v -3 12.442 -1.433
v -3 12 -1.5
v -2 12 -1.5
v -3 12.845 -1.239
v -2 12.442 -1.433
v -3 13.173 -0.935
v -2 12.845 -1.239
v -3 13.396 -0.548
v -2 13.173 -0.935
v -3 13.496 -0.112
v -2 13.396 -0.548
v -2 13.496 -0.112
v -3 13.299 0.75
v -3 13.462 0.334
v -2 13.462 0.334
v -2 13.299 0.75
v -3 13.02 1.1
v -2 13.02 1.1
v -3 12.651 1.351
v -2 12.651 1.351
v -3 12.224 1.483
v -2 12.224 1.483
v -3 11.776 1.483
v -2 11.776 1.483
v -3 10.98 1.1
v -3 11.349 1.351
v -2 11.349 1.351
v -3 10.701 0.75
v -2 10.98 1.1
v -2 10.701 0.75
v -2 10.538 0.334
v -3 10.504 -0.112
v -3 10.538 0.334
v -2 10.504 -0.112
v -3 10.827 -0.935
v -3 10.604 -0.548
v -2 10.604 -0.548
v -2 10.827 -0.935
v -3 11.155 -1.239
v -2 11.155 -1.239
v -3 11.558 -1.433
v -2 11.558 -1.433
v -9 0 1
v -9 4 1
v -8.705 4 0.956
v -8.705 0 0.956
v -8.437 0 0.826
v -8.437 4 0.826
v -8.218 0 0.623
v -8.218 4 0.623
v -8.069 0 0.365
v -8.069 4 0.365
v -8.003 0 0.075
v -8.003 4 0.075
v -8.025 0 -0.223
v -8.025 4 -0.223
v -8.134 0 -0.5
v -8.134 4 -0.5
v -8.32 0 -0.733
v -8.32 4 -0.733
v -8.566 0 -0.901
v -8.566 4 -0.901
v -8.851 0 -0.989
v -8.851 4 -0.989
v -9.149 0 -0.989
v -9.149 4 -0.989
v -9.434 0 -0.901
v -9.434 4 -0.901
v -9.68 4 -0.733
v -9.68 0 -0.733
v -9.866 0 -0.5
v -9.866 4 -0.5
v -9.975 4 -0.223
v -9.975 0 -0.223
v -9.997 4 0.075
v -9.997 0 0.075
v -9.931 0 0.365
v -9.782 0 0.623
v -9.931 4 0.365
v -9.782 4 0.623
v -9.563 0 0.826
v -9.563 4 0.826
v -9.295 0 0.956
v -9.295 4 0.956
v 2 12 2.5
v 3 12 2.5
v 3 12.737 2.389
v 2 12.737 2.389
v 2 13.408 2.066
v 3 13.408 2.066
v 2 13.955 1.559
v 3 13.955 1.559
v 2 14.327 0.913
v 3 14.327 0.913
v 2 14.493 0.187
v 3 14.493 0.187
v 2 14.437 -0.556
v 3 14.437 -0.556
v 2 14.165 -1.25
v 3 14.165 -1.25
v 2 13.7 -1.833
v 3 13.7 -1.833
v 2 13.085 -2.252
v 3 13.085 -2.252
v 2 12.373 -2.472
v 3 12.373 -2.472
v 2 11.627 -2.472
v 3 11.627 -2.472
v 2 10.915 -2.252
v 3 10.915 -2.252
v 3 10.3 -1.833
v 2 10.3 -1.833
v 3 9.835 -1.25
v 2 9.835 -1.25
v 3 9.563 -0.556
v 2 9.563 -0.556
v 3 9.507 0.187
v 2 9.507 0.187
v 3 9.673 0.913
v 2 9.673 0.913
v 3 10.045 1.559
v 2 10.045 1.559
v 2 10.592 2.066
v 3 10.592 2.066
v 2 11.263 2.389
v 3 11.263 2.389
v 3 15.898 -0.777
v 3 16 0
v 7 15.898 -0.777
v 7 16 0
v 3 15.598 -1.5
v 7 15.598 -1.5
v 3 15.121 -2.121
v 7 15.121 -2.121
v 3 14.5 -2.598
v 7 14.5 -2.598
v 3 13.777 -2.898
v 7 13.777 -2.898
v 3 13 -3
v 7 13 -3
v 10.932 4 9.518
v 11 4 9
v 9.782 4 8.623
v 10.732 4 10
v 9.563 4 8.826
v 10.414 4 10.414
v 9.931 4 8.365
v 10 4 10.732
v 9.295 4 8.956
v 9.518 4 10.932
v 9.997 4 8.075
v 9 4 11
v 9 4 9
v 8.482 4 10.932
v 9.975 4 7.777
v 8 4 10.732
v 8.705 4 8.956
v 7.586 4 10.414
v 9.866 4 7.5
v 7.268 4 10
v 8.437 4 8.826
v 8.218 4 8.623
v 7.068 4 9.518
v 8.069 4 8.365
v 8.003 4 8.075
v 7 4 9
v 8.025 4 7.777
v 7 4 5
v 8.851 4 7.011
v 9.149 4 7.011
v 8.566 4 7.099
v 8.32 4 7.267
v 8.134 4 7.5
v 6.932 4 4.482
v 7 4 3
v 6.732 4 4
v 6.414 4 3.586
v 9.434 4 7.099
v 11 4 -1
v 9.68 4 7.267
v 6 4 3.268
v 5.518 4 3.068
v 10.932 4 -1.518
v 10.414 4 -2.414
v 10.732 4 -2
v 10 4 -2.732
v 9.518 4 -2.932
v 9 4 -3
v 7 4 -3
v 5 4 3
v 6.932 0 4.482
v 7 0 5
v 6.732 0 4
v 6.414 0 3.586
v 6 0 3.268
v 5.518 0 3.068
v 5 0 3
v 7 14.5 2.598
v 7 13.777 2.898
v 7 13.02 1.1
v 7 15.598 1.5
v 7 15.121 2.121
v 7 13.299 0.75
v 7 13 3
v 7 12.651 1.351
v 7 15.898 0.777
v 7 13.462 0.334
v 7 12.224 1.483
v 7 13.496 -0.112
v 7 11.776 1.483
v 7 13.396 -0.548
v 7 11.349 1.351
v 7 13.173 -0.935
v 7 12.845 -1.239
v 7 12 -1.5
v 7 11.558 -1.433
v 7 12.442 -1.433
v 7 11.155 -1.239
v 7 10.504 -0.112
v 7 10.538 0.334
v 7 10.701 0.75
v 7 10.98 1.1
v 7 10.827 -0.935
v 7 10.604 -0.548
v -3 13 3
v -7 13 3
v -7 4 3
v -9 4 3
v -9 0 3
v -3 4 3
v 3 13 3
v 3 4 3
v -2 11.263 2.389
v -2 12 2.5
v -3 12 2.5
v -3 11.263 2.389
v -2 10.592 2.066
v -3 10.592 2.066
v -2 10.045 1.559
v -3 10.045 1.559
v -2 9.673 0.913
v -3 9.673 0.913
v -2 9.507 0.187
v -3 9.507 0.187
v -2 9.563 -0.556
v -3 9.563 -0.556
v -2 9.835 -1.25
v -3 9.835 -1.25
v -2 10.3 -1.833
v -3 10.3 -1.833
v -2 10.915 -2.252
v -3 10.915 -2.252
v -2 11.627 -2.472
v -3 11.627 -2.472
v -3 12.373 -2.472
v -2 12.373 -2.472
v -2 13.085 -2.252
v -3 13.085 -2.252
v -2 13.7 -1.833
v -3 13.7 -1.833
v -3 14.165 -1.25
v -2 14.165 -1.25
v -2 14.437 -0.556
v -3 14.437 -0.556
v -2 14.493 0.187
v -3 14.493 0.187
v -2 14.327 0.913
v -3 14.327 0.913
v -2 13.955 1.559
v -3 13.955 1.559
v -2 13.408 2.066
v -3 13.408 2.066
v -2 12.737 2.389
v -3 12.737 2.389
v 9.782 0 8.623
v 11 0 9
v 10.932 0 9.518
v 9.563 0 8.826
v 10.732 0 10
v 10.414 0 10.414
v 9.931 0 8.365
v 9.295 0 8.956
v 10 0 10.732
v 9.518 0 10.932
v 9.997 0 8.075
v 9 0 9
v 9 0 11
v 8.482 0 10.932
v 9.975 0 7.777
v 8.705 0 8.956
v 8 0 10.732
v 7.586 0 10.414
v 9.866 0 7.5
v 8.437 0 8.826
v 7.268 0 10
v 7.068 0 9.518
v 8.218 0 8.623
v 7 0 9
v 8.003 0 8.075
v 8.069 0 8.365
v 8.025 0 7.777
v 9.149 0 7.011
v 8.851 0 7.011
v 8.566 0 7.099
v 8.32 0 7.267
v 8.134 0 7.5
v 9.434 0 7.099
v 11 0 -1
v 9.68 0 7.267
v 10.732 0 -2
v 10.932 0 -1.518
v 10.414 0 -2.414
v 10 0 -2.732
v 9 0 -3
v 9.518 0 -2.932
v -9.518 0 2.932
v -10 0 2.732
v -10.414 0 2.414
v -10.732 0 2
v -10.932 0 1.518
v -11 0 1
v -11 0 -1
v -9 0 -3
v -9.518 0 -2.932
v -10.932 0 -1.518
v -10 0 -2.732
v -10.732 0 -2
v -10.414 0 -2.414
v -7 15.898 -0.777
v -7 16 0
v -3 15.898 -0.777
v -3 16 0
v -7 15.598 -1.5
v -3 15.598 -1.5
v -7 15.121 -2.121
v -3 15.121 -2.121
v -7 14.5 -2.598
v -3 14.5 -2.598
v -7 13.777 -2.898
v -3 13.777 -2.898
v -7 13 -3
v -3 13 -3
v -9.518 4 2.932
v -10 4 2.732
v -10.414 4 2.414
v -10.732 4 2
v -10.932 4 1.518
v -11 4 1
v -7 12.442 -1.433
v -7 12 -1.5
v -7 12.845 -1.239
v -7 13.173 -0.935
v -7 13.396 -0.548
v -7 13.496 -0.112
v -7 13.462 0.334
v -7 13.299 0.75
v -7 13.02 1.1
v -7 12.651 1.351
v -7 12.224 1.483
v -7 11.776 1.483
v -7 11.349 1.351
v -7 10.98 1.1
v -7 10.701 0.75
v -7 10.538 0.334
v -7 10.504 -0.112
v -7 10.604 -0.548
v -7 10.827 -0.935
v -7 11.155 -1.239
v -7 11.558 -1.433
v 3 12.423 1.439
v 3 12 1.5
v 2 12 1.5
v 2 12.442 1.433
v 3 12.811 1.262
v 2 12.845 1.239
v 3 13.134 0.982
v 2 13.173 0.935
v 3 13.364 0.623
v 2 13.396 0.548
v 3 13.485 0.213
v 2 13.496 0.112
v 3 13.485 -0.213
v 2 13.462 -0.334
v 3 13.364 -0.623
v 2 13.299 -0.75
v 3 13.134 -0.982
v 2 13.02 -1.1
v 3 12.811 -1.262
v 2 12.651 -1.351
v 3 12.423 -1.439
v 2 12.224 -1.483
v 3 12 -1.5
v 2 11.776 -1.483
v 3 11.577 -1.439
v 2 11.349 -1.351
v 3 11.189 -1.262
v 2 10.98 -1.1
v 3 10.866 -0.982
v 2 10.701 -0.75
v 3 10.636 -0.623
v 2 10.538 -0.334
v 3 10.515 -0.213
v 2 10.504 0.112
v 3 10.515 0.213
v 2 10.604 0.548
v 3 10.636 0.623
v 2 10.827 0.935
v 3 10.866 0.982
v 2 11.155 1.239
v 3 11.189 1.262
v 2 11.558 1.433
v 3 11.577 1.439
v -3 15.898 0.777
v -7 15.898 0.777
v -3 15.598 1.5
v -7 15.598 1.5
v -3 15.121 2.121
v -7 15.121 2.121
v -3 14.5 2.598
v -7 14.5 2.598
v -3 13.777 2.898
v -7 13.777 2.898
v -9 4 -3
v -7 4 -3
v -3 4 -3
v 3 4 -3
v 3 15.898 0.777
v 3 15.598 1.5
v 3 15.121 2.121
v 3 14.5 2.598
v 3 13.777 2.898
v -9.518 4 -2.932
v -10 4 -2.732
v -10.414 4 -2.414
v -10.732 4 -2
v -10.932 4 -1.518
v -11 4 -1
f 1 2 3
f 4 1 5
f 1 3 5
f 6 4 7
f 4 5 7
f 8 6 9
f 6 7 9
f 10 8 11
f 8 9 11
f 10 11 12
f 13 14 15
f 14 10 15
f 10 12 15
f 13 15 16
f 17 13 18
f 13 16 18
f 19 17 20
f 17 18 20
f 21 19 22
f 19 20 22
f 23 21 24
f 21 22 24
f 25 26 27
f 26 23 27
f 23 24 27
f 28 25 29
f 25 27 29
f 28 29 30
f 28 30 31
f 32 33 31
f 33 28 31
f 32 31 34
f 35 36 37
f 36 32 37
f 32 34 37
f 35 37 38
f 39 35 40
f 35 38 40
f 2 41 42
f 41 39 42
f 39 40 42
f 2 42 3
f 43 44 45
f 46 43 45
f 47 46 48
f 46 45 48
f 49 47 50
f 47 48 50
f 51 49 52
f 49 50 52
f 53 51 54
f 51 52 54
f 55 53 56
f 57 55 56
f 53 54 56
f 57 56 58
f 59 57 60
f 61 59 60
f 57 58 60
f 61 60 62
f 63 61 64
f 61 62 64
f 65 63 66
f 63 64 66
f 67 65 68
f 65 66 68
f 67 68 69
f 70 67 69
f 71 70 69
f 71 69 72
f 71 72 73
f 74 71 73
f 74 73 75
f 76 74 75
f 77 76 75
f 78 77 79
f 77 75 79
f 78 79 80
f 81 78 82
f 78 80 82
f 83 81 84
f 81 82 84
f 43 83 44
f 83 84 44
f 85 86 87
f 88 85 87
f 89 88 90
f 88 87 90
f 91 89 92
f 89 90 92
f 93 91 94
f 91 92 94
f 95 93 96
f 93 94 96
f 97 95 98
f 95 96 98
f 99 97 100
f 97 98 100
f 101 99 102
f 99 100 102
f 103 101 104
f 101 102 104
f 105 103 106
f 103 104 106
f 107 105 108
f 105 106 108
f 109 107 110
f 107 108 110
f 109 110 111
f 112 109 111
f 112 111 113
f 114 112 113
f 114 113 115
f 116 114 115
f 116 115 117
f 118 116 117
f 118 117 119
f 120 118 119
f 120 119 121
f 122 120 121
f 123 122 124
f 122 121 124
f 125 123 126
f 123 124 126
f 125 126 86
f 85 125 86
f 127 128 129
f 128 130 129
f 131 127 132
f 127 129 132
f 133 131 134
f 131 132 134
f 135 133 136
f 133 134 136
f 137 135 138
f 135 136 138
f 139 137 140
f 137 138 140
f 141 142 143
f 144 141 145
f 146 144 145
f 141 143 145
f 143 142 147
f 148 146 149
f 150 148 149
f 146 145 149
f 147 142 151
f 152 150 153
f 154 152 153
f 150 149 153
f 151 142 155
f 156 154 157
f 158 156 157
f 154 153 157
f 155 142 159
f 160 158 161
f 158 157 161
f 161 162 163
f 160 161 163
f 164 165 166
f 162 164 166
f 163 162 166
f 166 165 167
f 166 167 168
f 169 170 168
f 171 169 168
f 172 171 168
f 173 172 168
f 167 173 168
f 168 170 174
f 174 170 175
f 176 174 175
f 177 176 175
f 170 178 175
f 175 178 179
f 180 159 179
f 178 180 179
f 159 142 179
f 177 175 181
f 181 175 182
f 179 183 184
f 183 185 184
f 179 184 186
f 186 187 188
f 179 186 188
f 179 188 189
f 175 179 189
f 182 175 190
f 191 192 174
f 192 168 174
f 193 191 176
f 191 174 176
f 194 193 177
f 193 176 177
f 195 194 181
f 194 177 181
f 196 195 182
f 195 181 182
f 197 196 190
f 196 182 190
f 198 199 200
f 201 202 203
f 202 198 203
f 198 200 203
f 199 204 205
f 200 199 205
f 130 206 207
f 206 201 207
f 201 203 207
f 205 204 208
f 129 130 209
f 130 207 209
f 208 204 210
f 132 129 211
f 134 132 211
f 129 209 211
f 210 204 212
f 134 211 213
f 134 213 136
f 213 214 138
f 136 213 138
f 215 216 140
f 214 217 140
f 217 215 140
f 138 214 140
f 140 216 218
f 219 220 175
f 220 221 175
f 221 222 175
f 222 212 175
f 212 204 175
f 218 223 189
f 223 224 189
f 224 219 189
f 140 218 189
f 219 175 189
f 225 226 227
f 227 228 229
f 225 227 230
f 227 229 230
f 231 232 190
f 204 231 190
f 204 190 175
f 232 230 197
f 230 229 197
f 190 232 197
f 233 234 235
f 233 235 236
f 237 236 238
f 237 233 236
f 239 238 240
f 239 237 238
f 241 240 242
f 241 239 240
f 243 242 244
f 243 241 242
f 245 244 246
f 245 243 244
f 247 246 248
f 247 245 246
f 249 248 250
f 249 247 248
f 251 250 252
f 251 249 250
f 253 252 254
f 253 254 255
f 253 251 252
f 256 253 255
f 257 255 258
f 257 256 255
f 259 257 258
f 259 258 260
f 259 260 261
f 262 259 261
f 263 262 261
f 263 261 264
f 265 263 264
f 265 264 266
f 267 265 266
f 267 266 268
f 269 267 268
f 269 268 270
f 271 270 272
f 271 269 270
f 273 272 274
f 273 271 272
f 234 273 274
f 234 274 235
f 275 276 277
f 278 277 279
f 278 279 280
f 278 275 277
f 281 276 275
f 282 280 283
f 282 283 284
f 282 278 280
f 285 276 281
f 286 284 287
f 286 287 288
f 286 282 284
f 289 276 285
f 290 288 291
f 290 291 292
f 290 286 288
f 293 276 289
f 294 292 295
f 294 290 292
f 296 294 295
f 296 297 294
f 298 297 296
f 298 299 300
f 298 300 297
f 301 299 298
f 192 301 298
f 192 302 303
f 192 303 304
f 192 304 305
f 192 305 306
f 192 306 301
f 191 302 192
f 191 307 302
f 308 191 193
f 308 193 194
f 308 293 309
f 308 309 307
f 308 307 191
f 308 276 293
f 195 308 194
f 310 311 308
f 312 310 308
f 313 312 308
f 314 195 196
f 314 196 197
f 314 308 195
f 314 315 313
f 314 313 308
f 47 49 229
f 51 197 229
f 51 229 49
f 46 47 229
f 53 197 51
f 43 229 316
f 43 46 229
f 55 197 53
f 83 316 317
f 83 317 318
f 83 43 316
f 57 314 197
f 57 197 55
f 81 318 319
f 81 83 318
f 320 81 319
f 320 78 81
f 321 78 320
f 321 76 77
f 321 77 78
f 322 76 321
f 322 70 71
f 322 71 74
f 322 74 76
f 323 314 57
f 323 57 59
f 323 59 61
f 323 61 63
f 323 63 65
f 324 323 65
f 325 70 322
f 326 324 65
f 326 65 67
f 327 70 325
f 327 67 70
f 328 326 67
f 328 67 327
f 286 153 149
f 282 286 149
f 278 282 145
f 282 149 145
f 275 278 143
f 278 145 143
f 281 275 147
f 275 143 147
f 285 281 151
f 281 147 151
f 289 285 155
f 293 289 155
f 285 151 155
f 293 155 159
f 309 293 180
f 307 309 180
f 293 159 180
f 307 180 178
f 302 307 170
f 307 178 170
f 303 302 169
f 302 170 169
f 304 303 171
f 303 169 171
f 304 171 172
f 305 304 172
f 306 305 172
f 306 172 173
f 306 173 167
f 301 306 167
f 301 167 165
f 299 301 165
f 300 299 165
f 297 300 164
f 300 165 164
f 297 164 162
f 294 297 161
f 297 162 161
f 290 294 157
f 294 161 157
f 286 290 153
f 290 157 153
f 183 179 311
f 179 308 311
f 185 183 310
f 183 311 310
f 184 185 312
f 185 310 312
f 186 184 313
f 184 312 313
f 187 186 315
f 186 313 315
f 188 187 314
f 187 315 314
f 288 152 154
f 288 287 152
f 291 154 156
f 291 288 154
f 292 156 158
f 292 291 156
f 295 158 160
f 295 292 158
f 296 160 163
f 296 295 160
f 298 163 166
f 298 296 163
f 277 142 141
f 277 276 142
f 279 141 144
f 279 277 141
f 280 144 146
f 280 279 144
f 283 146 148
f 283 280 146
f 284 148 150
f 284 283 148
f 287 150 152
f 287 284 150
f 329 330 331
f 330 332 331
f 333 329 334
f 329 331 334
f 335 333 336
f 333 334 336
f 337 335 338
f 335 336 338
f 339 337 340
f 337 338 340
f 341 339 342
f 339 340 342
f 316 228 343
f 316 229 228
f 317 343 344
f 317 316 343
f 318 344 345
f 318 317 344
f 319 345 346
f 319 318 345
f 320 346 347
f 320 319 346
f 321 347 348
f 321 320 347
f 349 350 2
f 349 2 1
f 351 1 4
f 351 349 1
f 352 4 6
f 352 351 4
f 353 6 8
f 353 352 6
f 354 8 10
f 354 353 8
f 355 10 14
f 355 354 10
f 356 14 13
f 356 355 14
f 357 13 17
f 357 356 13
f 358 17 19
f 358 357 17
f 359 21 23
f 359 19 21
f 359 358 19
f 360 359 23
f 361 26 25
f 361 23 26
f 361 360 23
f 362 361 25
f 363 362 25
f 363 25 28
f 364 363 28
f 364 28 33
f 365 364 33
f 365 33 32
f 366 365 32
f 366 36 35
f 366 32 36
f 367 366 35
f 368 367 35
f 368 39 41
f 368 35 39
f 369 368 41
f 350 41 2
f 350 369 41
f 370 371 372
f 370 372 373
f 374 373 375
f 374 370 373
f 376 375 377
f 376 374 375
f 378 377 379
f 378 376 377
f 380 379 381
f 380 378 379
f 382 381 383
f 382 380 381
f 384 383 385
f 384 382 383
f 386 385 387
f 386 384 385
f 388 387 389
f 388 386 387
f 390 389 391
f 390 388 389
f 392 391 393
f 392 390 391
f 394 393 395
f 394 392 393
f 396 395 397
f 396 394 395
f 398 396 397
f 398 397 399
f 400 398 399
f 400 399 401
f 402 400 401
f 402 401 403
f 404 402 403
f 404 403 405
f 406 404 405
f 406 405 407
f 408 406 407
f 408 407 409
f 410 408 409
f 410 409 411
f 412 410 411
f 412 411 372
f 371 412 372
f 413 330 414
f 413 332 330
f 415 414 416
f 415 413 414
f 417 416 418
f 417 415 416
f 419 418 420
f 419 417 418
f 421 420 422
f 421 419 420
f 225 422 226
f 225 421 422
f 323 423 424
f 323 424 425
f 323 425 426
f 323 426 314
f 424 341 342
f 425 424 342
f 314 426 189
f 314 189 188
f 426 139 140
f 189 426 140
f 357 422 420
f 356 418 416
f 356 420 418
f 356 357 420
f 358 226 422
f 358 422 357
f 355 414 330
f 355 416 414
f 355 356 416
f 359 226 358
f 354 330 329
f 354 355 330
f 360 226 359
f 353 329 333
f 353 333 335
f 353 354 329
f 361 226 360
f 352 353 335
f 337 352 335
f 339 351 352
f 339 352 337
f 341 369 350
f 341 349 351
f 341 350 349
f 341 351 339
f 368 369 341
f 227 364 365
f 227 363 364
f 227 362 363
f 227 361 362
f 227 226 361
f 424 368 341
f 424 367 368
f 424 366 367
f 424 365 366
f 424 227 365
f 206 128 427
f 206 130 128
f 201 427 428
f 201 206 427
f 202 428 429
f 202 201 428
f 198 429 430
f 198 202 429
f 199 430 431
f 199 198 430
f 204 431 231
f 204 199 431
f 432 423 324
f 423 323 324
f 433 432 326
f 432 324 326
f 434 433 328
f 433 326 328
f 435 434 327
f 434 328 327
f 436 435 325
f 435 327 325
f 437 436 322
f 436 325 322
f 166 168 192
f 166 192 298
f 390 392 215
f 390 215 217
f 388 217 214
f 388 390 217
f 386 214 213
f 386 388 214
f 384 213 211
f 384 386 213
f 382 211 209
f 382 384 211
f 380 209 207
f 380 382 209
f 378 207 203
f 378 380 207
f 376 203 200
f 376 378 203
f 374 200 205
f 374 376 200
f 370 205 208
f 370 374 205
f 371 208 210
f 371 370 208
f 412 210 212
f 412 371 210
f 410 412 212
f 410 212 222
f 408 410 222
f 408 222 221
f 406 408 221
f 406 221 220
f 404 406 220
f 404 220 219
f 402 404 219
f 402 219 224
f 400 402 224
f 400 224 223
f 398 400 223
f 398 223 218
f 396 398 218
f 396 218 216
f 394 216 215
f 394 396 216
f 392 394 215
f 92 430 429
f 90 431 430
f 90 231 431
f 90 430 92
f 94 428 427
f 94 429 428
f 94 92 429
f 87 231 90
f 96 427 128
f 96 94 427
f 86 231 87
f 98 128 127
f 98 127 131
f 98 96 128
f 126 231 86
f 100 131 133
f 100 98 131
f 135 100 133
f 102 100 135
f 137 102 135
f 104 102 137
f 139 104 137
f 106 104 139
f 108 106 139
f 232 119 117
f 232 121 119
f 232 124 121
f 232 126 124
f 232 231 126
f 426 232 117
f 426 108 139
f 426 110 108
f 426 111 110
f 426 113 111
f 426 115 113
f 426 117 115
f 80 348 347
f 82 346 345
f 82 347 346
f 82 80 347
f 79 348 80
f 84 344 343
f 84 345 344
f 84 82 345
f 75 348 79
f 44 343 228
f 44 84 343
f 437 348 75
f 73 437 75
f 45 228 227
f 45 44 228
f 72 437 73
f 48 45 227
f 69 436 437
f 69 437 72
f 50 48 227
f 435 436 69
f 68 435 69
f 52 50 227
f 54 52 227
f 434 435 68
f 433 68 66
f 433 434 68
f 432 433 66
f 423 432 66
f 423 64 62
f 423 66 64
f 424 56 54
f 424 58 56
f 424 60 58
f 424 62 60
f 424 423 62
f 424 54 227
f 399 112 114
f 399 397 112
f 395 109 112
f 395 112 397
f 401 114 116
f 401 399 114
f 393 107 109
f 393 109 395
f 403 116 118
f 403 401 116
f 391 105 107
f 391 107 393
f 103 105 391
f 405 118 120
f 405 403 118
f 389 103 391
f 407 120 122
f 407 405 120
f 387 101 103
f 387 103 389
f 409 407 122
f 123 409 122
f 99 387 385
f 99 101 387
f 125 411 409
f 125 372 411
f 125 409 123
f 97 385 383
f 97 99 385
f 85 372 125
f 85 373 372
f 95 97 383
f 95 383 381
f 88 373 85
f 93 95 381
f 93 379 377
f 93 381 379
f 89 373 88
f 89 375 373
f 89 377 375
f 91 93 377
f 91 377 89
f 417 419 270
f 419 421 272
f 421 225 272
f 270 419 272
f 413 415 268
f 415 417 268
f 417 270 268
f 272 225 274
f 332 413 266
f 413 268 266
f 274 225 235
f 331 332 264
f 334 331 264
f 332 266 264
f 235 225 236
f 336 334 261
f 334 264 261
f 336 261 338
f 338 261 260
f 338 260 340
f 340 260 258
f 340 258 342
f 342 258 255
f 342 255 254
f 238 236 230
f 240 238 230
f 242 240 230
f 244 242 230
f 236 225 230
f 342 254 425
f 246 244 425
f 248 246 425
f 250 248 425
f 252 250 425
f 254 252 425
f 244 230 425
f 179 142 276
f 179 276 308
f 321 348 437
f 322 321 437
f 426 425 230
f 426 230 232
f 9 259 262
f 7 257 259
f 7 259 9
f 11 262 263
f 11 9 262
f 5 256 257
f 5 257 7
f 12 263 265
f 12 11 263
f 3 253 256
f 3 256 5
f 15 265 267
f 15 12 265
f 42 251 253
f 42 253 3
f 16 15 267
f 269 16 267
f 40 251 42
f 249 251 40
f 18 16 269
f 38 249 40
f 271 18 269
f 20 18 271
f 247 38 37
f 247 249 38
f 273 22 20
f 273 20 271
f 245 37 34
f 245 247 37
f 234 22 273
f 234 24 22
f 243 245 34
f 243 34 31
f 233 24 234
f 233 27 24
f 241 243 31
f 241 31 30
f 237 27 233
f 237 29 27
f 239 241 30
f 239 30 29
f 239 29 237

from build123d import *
from build123d.topology import SkipClean

# Parameters (mm, degrees)
SKETCH2_W               = 14
SKETCH2_H               = 6
BOSS_EXTRUDE1_DEPTH     = 4
SKETCH3_W               = 4
SKETCH3_H               = 6
BOSS_EXTRUDE2_DEPTH     = 12
CUT_EXTRUDE1_DEPTH      = 22.470910554
CUT_EXTRUDE1_DEPTH_BACK = 22.470910554
SKETCH4_R               = 1.5
BOSS_EXTRUDE3_START     = 1
SKETCH5_R               = 2.5
SKETCH5_R_2             = 1.5
BOSS_EXTRUDE3_DEPTH     = 1
SKETCH6_R               = 2.5
SKETCH6_R_2             = 1.5
BOSS_EXTRUDE4_DEPTH     = 1
SKETCH7_R               = 1
SKETCH7_W               = 4
SKETCH7_H               = 6
BOSS_EXTRUDE5_DEPTH     = 4
FILLET1_R               = 2
FILLET2_R               = 3


with BuildPart() as part:
    # Sketch2 → Boss-Extrude1 (new body)
    with BuildSketch(Plane(origin=(0, 0, 0), x_dir=(1, 0, 0), z_dir=(0, 1, 0))):
        Rectangle(SKETCH2_W, SKETCH2_H)
    extrude(amount=BOSS_EXTRUDE1_DEPTH)

    # Sketch3 → Boss-Extrude2 (add)
    with BuildSketch(Plane(origin=(0, 4, 0), x_dir=(1, 0, 0), z_dir=(0, 1, 0))):
        with Locations((-5, 0)):
            Rectangle(SKETCH3_W, SKETCH3_H)
        with Locations((5, 0)):
            Rectangle(SKETCH3_W, SKETCH3_H)
    extrude(amount=BOSS_EXTRUDE2_DEPTH)

    # Sketch4 → Cut-Extrude1 (cut, two sides: drawn at the far end of the back side and taken through both)
    with BuildSketch(Plane(origin=(7, 0, 0), x_dir=(0, 0, -1), z_dir=(1, 0, 0)).offset(-CUT_EXTRUDE1_DEPTH_BACK)):
        with Locations((0, 12)):
            Circle(SKETCH4_R)
    extrude(amount=CUT_EXTRUDE1_DEPTH + CUT_EXTRUDE1_DEPTH_BACK, mode=Mode.SUBTRACT)

    # Sketch5 → Boss-Extrude3 (add)
    with BuildSketch(Plane(origin=(-3, 0, 0), x_dir=(0, 0, -1), z_dir=(1, 0, 0)).offset(BOSS_EXTRUDE3_START)):
        with Locations(Location((0, 12, 0), (0, 0, 180))):
            Circle(SKETCH5_R)
        with Locations((0, 12)):
            Circle(SKETCH5_R_2, mode=Mode.SUBTRACT)
    extrude(amount=-BOSS_EXTRUDE3_DEPTH)

    # Sketch6 → Boss-Extrude4 (add)
    with SkipClean():  # the faces are left unmerged after this step: merging them gives an invalid solid
        with BuildSketch(Plane.ZY.offset(-3)):
            with Locations((0, 12)):
                Circle(SKETCH6_R)
            with Locations((0, 12)):
                Circle(SKETCH6_R_2, mode=Mode.SUBTRACT)
        extrude(amount=BOSS_EXTRUDE4_DEPTH)

    # Sketch7 → Boss-Extrude5 (add)
    # profile 1 of 2: a face of its own
    with SkipClean():  # the faces are left unmerged after this step: merging them gives an invalid solid
        with BuildSketch(Plane(origin=(0, 4, 0), x_dir=(1, 0, 0), z_dir=(0, 1, 0))):
            Polygon((11, 3), (11, -3), (11, -11), (7, -11), (7, -3), (7, 3), align=None)
            with Locations(Location((9, -8, 0), (0, 0, 270))):
                Circle(SKETCH7_R, mode=Mode.SUBTRACT)
        # profile 2 of 2: a face of its own
        with BuildSketch(Plane(origin=(0, 4, 0), x_dir=(1, 0, 0), z_dir=(0, 1, 0))):
            with Locations((-9, 0)):
                Rectangle(SKETCH7_W, SKETCH7_H)
            with Locations(Location((-9, 0, 0), (0, 0, 270))):
                Circle(SKETCH7_R, mode=Mode.SUBTRACT)
        extrude(amount=-BOSS_EXTRUDE5_DEPTH)

    # Fillet1
    fillet1_edges = [part.edges().sort_by_distance(p)[0] for p in [
        (-11, 2, -3),
        (11, 2, -3),
        (11, 2, 11),
        (7, 2, 11),
        (-11, 2, 3),
        (7, 2, 3),
    ]]
    fillet(fillet1_edges, radius=FILLET1_R - 0.0001)  # a hair under: the kernel refuses the full size

    # Fillet2
    fillet2_edges = [part.edges().sort_by_distance(p)[0] for p in [
        (-5, 16, -3),
        (5, 16, -3),
        (5, 16, 3),
        (-5, 16, 3),
    ]]
    fillet(fillet2_edges, radius=FILLET2_R - 0.0001)  # a hair under: the kernel refuses the full size


solid = part.part
